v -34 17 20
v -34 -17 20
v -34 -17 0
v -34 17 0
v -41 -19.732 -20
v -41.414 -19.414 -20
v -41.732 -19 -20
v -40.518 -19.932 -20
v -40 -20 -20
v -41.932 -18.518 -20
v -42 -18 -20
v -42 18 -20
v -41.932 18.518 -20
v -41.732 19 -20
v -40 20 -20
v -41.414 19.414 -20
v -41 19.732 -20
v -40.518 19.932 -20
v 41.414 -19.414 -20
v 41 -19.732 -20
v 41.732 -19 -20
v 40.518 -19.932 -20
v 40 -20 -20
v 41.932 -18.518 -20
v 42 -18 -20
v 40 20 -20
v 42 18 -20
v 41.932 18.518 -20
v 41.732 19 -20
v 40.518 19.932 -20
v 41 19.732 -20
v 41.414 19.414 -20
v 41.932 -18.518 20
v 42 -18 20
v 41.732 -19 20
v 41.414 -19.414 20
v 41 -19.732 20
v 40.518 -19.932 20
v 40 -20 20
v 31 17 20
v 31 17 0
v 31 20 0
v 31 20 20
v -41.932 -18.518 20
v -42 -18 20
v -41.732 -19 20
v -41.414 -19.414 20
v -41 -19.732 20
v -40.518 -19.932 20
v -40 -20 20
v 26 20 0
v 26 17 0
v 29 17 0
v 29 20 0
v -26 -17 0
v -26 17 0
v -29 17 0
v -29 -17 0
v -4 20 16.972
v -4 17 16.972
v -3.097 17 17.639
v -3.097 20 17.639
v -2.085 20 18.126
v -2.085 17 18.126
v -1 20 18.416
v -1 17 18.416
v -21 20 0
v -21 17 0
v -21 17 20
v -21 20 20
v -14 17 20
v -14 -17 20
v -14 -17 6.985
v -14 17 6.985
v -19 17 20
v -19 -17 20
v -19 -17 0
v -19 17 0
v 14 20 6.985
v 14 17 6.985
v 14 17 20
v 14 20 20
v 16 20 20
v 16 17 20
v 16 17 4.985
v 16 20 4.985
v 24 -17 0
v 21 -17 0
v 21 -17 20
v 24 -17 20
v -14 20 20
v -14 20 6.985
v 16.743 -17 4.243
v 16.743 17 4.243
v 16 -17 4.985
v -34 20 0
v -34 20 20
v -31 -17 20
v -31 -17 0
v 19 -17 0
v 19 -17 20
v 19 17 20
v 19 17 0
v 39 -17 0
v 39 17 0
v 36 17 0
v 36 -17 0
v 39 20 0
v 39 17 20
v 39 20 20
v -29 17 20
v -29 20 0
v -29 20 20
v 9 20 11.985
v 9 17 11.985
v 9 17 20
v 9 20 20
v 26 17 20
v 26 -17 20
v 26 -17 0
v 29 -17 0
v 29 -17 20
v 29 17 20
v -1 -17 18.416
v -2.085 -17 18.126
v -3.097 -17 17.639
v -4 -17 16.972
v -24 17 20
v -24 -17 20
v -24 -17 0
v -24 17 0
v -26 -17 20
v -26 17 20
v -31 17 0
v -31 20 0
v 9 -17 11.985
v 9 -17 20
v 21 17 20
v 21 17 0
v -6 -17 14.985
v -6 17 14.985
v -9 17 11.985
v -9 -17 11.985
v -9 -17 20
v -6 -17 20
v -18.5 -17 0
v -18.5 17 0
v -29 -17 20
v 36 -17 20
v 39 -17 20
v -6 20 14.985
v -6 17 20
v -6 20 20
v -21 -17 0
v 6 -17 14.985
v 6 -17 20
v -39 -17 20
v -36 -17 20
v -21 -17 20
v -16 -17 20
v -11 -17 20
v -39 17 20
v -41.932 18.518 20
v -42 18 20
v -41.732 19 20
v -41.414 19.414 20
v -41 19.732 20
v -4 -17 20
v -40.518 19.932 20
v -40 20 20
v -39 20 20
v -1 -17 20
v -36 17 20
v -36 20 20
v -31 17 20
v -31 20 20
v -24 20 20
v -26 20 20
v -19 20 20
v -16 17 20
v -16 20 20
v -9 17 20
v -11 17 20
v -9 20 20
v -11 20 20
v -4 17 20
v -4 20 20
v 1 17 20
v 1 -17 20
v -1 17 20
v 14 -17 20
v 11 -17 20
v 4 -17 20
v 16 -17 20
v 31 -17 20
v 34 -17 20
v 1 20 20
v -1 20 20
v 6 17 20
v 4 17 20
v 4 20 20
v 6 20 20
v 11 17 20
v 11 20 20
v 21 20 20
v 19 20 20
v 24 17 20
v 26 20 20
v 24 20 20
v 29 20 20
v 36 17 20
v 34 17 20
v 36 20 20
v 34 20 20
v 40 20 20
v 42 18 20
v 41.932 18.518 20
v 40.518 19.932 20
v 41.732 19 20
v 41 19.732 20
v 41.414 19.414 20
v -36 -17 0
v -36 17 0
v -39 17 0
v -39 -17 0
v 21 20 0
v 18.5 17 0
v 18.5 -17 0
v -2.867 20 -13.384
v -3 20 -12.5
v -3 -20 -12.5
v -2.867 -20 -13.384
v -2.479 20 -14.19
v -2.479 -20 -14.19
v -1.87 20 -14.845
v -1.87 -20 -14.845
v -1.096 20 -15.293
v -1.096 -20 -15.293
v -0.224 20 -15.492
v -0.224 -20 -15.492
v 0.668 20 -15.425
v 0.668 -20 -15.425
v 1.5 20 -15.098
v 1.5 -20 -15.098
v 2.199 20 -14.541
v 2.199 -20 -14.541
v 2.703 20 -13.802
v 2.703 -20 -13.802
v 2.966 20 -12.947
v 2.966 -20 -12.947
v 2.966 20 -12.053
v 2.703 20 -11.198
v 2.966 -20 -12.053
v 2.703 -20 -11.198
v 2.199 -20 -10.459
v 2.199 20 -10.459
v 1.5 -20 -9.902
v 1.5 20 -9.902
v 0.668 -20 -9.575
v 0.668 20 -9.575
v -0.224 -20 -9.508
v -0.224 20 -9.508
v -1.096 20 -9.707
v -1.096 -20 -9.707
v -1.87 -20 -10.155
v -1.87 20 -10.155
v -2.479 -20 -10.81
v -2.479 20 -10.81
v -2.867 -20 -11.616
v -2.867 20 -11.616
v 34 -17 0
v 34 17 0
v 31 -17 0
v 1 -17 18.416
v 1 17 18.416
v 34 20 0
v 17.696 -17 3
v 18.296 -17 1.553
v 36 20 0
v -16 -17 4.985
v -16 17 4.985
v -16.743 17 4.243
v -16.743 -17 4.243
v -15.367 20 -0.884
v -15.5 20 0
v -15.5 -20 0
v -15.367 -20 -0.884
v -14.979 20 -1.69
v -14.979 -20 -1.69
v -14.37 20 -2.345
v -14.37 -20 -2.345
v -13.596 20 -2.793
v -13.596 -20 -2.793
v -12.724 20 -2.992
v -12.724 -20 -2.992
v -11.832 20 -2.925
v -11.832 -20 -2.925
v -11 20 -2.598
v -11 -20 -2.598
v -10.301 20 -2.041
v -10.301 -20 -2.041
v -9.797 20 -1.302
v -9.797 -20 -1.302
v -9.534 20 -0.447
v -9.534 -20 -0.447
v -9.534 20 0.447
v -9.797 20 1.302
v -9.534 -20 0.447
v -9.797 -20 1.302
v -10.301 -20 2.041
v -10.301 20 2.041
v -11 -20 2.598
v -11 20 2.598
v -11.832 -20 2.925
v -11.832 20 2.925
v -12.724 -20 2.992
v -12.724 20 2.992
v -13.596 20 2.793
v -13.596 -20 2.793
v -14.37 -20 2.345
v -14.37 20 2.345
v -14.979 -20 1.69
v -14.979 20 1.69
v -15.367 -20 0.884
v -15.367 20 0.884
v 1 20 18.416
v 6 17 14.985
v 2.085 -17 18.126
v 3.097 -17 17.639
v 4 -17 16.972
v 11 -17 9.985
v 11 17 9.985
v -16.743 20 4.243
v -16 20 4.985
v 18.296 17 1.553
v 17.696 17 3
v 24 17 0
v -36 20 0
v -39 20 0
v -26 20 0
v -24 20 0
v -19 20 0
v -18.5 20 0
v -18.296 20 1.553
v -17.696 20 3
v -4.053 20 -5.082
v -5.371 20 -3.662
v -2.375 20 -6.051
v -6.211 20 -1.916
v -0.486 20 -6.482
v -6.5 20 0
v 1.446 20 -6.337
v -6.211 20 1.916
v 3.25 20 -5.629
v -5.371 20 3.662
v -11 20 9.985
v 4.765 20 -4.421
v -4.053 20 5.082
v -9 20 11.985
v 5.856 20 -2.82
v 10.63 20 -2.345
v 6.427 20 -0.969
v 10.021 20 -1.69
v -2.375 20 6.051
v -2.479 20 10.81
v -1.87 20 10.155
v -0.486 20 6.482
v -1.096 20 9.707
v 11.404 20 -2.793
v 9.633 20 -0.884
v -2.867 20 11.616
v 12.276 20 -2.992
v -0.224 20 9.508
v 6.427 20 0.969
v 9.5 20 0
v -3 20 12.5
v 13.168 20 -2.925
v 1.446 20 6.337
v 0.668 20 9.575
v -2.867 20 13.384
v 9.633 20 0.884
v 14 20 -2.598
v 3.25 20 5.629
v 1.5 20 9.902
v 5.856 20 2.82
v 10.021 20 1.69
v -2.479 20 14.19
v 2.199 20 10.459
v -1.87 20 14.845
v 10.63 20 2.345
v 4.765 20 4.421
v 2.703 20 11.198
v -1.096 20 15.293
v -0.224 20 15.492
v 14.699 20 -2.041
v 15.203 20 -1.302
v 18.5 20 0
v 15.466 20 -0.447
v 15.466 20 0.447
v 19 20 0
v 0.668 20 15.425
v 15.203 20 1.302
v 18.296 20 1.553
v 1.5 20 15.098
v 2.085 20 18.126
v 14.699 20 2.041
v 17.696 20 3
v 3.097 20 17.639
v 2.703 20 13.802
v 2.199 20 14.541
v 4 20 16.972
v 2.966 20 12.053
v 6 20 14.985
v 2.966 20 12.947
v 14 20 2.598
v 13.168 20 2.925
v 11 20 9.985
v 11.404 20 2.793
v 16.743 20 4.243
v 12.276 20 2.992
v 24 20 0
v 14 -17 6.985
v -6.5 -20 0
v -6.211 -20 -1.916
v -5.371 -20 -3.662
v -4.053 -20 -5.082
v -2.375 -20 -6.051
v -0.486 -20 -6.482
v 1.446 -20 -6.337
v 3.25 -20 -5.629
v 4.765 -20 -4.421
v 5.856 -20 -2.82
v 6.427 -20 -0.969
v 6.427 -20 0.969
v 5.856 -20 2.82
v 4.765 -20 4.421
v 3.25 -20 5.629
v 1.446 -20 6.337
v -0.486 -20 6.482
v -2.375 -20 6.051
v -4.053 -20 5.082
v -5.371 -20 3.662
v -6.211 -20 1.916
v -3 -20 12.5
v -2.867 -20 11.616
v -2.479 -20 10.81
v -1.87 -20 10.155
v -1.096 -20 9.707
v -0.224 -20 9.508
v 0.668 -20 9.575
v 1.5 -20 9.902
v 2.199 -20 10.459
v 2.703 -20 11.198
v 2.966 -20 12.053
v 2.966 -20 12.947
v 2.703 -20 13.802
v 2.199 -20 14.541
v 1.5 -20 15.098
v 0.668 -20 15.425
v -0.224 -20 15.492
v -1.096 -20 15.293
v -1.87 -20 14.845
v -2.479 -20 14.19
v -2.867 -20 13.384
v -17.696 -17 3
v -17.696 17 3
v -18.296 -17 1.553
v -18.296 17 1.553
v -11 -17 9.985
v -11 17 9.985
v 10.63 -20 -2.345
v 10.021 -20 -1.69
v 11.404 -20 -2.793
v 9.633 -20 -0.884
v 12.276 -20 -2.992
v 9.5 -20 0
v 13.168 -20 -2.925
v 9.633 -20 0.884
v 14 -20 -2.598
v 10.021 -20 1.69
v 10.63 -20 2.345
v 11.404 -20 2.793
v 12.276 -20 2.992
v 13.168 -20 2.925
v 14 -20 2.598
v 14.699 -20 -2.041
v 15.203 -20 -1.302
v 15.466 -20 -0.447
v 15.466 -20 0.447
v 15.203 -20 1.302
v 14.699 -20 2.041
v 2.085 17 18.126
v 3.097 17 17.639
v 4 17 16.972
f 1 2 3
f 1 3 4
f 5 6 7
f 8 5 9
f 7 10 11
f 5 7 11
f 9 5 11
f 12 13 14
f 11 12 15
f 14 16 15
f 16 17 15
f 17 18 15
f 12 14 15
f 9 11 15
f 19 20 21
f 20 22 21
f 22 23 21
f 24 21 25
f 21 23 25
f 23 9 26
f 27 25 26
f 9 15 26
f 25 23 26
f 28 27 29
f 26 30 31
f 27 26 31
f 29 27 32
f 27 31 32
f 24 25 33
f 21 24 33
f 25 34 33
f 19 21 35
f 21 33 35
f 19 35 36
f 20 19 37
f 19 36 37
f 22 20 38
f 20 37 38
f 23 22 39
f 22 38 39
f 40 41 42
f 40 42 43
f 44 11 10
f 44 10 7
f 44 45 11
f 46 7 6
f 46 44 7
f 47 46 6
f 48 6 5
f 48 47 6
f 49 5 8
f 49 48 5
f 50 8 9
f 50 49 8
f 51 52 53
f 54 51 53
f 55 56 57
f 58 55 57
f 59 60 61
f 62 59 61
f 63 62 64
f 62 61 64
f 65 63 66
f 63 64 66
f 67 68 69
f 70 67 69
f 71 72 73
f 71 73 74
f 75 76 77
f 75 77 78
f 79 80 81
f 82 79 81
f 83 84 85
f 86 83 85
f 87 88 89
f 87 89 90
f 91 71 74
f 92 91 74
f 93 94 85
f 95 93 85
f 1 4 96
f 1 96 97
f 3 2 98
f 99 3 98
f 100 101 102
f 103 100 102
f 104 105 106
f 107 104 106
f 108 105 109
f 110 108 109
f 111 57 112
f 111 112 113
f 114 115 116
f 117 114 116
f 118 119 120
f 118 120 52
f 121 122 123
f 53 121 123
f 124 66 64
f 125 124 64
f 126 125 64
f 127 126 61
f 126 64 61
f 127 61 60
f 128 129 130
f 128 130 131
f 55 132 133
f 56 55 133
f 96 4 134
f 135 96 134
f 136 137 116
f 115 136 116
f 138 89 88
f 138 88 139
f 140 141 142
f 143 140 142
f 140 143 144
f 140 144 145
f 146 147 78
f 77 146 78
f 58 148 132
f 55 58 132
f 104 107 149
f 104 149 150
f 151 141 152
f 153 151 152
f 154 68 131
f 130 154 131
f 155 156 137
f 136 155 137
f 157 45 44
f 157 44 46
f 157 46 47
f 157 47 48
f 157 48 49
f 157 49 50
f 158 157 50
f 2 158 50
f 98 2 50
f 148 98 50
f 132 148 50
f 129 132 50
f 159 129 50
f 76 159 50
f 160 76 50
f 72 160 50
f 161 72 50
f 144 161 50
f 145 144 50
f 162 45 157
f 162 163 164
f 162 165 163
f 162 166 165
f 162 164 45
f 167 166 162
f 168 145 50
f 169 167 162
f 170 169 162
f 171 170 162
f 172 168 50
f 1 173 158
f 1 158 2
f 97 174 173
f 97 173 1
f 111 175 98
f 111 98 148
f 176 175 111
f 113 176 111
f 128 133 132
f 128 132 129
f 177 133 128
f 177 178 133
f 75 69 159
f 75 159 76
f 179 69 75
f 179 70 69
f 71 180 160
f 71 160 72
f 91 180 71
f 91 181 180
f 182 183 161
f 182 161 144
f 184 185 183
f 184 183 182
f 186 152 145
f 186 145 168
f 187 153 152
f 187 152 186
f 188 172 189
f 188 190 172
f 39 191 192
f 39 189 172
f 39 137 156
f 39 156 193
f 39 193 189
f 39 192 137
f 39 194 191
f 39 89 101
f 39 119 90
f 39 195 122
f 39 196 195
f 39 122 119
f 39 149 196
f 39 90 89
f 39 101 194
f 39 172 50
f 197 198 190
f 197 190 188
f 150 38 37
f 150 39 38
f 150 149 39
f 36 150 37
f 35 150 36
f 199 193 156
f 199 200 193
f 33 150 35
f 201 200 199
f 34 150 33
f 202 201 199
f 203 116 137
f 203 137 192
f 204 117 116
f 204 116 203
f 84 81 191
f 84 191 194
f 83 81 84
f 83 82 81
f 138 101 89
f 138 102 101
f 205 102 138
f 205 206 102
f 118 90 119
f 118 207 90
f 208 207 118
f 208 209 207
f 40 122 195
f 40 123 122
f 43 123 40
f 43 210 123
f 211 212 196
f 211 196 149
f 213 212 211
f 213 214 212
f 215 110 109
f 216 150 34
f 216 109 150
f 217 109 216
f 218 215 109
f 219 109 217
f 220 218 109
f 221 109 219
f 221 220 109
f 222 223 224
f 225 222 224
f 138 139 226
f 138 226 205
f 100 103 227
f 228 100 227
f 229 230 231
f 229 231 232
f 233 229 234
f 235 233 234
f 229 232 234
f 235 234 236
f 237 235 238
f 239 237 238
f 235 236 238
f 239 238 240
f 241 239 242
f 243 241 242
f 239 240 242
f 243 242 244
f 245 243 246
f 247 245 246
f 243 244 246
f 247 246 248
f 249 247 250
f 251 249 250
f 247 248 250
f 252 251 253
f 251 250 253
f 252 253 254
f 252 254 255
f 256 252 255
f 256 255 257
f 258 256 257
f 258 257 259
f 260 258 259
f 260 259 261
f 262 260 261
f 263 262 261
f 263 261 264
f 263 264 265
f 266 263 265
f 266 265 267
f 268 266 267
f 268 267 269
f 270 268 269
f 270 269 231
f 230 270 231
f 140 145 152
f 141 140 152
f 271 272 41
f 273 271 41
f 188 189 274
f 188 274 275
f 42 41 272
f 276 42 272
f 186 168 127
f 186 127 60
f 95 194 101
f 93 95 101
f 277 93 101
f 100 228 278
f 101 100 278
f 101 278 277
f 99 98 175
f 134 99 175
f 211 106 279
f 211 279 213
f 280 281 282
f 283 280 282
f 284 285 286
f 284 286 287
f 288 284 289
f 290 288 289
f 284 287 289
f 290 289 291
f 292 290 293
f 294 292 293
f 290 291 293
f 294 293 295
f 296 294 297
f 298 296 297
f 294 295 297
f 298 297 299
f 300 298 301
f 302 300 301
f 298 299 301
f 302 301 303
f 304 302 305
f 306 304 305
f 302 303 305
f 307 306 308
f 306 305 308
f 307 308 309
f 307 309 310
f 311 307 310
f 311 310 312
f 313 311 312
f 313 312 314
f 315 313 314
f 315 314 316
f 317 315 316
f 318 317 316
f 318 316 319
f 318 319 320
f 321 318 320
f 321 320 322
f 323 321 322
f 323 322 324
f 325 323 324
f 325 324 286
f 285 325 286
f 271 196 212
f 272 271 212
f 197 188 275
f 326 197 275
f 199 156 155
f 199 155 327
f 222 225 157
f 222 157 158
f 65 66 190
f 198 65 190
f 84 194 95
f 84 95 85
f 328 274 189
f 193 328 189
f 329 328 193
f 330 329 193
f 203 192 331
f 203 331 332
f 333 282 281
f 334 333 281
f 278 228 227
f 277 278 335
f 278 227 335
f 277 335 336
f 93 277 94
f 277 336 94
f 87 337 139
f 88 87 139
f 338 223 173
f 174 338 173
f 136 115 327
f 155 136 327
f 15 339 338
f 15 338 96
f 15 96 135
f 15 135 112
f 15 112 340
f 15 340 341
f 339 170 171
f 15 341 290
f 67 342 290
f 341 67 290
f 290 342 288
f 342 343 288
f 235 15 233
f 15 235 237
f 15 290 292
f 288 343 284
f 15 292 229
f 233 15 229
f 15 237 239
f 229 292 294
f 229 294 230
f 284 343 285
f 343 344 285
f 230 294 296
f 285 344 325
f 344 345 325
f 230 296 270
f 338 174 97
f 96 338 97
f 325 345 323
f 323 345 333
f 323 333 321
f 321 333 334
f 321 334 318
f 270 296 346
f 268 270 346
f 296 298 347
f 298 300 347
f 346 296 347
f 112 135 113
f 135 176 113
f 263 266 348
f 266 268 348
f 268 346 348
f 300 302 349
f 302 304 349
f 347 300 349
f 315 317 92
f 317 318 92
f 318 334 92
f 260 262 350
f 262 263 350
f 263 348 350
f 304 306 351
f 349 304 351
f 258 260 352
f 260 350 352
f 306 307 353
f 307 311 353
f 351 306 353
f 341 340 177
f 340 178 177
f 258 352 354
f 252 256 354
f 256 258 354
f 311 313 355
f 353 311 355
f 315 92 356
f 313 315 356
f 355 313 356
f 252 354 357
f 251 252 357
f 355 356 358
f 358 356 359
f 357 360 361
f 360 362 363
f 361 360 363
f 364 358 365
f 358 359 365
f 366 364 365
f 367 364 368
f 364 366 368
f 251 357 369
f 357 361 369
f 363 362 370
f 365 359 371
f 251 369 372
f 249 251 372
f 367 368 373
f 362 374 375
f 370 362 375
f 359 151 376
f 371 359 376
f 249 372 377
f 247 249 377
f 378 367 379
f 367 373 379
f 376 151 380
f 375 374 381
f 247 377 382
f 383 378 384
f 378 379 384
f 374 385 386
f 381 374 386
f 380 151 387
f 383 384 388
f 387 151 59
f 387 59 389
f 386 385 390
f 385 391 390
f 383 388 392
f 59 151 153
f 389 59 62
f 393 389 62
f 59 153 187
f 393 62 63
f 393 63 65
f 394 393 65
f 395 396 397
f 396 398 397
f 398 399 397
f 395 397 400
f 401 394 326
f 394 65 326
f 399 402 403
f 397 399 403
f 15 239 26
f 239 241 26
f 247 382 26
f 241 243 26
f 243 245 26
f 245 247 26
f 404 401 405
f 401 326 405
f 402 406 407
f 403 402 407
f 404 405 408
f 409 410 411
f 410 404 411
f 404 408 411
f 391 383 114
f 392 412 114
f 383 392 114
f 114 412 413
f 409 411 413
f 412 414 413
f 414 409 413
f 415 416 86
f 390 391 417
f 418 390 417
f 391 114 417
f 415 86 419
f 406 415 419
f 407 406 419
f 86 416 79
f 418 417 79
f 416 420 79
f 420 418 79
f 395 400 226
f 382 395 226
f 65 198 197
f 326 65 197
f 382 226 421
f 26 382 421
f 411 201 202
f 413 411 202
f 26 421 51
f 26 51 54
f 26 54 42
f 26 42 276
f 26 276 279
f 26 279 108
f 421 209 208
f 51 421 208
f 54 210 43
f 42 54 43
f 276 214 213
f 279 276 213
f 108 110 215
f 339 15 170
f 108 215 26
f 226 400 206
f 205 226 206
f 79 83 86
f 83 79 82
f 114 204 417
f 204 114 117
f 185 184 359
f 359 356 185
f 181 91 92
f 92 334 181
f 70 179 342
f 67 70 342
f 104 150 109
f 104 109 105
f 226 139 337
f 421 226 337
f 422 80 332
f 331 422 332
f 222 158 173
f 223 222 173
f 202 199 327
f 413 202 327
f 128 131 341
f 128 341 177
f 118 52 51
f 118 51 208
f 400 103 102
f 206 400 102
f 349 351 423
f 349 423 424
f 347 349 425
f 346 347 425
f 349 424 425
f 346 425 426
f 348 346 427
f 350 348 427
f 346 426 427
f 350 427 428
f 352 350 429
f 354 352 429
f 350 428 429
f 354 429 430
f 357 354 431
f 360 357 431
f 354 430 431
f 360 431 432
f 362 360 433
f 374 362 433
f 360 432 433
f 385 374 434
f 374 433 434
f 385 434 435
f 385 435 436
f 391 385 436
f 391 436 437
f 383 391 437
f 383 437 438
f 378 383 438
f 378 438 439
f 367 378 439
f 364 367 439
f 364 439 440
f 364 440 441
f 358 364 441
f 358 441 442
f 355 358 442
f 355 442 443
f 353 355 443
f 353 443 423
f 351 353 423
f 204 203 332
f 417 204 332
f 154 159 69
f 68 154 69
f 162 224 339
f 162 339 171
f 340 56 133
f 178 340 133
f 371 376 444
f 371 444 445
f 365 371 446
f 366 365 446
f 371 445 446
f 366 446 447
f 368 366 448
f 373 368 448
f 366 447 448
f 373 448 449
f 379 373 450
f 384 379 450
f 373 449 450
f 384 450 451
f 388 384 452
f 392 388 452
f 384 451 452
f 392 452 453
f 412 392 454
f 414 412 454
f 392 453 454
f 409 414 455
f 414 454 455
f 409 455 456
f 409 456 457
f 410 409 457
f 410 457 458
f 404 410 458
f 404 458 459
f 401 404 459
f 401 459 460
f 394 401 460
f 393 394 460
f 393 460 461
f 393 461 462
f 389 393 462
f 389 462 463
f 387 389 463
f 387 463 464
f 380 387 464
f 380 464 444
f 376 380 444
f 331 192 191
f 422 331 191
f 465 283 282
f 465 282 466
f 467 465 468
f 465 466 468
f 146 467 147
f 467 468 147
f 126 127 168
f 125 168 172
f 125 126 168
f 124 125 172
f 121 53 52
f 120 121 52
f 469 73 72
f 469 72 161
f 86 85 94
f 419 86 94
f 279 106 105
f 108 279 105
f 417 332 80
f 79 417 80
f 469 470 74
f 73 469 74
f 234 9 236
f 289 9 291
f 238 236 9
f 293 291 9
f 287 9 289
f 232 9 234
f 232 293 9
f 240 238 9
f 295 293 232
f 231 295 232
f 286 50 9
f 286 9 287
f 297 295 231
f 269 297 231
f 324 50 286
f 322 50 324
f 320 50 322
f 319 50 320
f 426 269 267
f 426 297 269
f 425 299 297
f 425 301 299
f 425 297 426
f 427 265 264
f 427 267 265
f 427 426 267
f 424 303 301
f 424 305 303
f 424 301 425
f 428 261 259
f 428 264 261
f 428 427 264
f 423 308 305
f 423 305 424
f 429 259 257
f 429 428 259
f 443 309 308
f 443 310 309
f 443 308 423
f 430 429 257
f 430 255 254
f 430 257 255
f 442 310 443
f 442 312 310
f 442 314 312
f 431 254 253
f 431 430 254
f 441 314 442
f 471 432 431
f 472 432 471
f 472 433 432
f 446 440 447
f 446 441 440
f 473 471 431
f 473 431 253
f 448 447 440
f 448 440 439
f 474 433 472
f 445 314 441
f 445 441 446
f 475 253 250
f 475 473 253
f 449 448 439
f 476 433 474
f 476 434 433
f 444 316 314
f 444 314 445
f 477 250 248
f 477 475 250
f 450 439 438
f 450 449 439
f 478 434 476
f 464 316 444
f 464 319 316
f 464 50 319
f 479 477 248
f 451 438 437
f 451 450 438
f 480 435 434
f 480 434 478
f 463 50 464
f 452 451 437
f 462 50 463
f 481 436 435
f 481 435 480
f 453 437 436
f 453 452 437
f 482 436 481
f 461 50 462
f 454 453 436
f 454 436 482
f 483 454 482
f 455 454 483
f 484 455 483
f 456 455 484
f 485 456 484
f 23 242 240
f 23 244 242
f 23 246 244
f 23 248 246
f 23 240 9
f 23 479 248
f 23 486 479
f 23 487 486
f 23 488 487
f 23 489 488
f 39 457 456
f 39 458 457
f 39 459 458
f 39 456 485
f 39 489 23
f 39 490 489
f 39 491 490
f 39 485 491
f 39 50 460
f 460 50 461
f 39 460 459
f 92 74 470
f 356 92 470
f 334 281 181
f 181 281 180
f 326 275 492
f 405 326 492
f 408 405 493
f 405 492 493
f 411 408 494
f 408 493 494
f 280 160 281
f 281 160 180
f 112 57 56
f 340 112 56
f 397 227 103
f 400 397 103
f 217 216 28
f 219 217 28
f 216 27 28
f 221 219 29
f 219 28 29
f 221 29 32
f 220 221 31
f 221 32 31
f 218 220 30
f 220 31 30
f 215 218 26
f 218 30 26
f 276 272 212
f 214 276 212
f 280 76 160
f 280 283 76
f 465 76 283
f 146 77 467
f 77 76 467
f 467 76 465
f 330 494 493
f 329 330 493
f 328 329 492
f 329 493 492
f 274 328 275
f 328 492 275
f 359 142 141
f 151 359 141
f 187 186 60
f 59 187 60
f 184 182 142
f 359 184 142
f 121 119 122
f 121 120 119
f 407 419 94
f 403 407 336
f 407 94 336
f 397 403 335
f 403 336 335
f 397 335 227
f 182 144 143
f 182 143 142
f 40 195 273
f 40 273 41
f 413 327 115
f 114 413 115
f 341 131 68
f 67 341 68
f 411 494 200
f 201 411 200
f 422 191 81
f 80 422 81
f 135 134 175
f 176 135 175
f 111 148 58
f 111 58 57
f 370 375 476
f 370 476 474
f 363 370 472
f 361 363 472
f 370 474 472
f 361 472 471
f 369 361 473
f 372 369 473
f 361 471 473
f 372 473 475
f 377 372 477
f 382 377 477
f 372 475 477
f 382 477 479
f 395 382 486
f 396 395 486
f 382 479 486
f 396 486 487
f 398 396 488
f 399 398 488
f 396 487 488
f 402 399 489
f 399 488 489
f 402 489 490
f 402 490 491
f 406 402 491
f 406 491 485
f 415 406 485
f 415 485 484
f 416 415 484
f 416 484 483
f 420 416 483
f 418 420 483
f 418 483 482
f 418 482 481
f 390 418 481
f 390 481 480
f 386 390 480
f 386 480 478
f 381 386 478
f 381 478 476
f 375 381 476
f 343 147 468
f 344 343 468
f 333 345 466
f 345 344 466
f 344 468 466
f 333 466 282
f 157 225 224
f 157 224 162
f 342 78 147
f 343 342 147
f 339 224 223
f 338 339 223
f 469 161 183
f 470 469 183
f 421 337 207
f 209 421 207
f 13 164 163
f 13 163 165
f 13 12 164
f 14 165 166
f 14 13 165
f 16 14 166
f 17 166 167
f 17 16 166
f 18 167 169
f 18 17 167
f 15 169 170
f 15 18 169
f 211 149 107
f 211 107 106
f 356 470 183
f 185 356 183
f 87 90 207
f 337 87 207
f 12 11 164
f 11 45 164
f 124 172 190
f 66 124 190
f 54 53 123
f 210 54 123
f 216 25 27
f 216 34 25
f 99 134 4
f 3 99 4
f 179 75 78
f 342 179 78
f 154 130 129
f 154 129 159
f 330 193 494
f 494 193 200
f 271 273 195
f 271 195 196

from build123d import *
from build123d.topology import SkipClean

# Parameters (mm, degrees)
SKETCH1_W           = 84
SKETCH1_H           = 40
BOSS_EXTRUDE1_DEPTH = 20
FILLET1_R           = 2
HOLE1_D             = 13
HOLE2_D             = 6
CUT_EXTRUDE2_DEPTH  = 17
RIB1_REACH          = 63.351
SKETCH10_WALLS_W    = 2
SKETCH10_WALLS_H    = 158.702893202
SKETCH12_W          = 3
SKETCH12_H          = 20
CUT_EXTRUDE3_DEPTH  = 60.439044407


with BuildPart() as part:
    # Sketch1 → Boss-Extrude1 (new, symmetric)
    with BuildSketch(Plane.XY):
        Rectangle(SKETCH1_W, SKETCH1_H)
    extrude(amount=BOSS_EXTRUDE1_DEPTH, both=True)

    # Fillet1
    fillet1_edges = [part.edges().sort_by_distance(p)[0] for p in [
        (42, -20, 0),
        (-42, -20, 0),
        (-42, 20, 0),
        (42, 20, 0),
    ]]
    fillet(fillet1_edges, radius=FILLET1_R)

    # Hole1 (through all)
    with Locations(Plane(origin=(0, 20, 0), x_dir=(1, 0, 0), z_dir=(0, 1, 0))):
        with Locations((0, 0)):
            Hole(HOLE1_D / 2)

    # Hole2 (through all)
    with Locations(Plane(origin=(0, 20, 0), x_dir=(1, 0, 0), z_dir=(0, 1, 0))):
        with Locations((12.5, 0), (0, -12.5), (-12.5, 0), (0, 12.5), (0, 0)):
            Hole(HOLE2_D / 2)

    # Sketch9 → Cut-Extrude2 (cut, symmetric)
    with BuildSketch(Plane(origin=(0, 0, 0), x_dir=(1, 0, 0), z_dir=(0, 1, 0))):
        with BuildLine():
            Line((-39, -20), (0, -20))
            Line((0, -20), (0, -18.5))
            ThreePointArc((0, -18.5), (-2.296100594, -18.043277195), (-4.242640687, -16.742640687))
            Line((-4.242640687, -16.742640687), (-16.742640687, -4.242640687))
            ThreePointArc((-16.742640687, -4.242640687), (-18.043277195, -2.296100594), (-18.5, 0))
            Line((-18.5, 0), (-39, 0))
            Line((-39, 0), (-39, -20))
        make_face()
        with BuildLine():
            Line((39, 0), (18.5, 0))
            ThreePointArc((18.5, 0), (18.043277195, -2.296100594), (16.742640687, -4.242640687))
            Line((16.742640687, -4.242640687), (4.242640687, -16.742640687))
            ThreePointArc((4.242640687, -16.742640687), (2.296100594, -18.043277195), (0, -18.5))
            Line((0, -18.5), (0, -20))
            Line((0, -20), (39, -20))
            Line((39, -20), (39, 0))
        make_face()
    extrude(amount=CUT_EXTRUDE2_DEPTH, both=True, mode=Mode.SUBTRACT)

    # Sketch10 walls → Rib1 (add, up to next)
    with BuildSketch(Plane.XY.offset(20), mode=Mode.PRIVATE) as rib1_sk1:
        Rectangle(SKETCH10_WALLS_W, SKETCH10_WALLS_H)
    rib1_tool1 = extrude(rib1_sk1.sketch, amount=-RIB1_REACH, mode=Mode.PRIVATE) - part.part
    # Sketch10 walls → Rib1 (add, up to next)
    with BuildSketch(Plane.XY.offset(20), mode=Mode.PRIVATE) as rib1_sk2:
        with Locations((5, 0)):
            Rectangle(SKETCH10_WALLS_W, SKETCH10_WALLS_H)
    rib1_tool2 = extrude(rib1_sk2.sketch, amount=-RIB1_REACH, mode=Mode.PRIVATE) - part.part
    # Sketch10 walls → Rib1 (add, up to next)
    with BuildSketch(Plane.XY.offset(20), mode=Mode.PRIVATE) as rib1_sk3:
        with Locations((10, 0)):
            Rectangle(SKETCH10_WALLS_W, SKETCH10_WALLS_H)
    rib1_tool3 = extrude(rib1_sk3.sketch, amount=-RIB1_REACH, mode=Mode.PRIVATE) - part.part
    # Sketch10 walls → Rib1 (add, up to next)
    with BuildSketch(Plane.XY.offset(20), mode=Mode.PRIVATE) as rib1_sk4:
        with Locations((15, 0)):
            Rectangle(SKETCH10_WALLS_W, SKETCH10_WALLS_H)
    rib1_tool4 = extrude(rib1_sk4.sketch, amount=-RIB1_REACH, mode=Mode.PRIVATE) - part.part
    # Sketch10 walls → Rib1 (add, up to next)
    with BuildSketch(Plane.XY.offset(20), mode=Mode.PRIVATE) as rib1_sk5:
        with Locations((20, 0)):
            Rectangle(SKETCH10_WALLS_W, SKETCH10_WALLS_H)
    rib1_tool5 = extrude(rib1_sk5.sketch, amount=-RIB1_REACH, mode=Mode.PRIVATE) - part.part
    # Sketch10 walls → Rib1 (add, up to next)
    with BuildSketch(Plane.XY.offset(20), mode=Mode.PRIVATE) as rib1_sk6:
        with Locations((25, 0)):
            Rectangle(SKETCH10_WALLS_W, SKETCH10_WALLS_H)
    rib1_tool6 = extrude(rib1_sk6.sketch, amount=-RIB1_REACH, mode=Mode.PRIVATE) - part.part
    # Sketch10 walls → Rib1 (add, up to next)
    with BuildSketch(Plane.XY.offset(20), mode=Mode.PRIVATE) as rib1_sk7:
        with Locations((30, 0)):
            Rectangle(SKETCH10_WALLS_W, SKETCH10_WALLS_H)
    rib1_tool7 = extrude(rib1_sk7.sketch, amount=-RIB1_REACH, mode=Mode.PRIVATE) - part.part
    # Sketch10 walls → Rib1 (add, up to next)
    with BuildSketch(Plane.XY.offset(20), mode=Mode.PRIVATE) as rib1_sk8:
        with Locations((35, 0)):
            Rectangle(SKETCH10_WALLS_W, SKETCH10_WALLS_H)
    rib1_tool8 = extrude(rib1_sk8.sketch, amount=-RIB1_REACH, mode=Mode.PRIVATE) - part.part
    # Sketch10 walls → Rib1 (add, up to next)
    with BuildSketch(Plane.XY.offset(20), mode=Mode.PRIVATE) as rib1_sk9:
        with Locations((-25, 0)):
            Rectangle(SKETCH10_WALLS_W, SKETCH10_WALLS_H)
    rib1_tool9 = extrude(rib1_sk9.sketch, amount=-RIB1_REACH, mode=Mode.PRIVATE) - part.part
    # Sketch10 walls → Rib1 (add, up to next)
    with BuildSketch(Plane.XY.offset(20), mode=Mode.PRIVATE) as rib1_sk10:
        with Locations((-20, 0)):
            Rectangle(SKETCH10_WALLS_W, SKETCH10_WALLS_H)
    rib1_tool10 = extrude(rib1_sk10.sketch, amount=-RIB1_REACH, mode=Mode.PRIVATE) - part.part
    # Sketch10 walls → Rib1 (add, up to next)
    with BuildSketch(Plane.XY.offset(20), mode=Mode.PRIVATE) as rib1_sk11:
        with Locations((-15, 0)):
            Rectangle(SKETCH10_WALLS_W, SKETCH10_WALLS_H)
    rib1_tool11 = extrude(rib1_sk11.sketch, amount=-RIB1_REACH, mode=Mode.PRIVATE) - part.part
    # Sketch10 walls → Rib1 (add, up to next)
    with BuildSketch(Plane.XY.offset(20), mode=Mode.PRIVATE) as rib1_sk12:
        with Locations((-10, 0)):
            Rectangle(SKETCH10_WALLS_W, SKETCH10_WALLS_H)
    rib1_tool12 = extrude(rib1_sk12.sketch, amount=-RIB1_REACH, mode=Mode.PRIVATE) - part.part
    # Sketch10 walls → Rib1 (add, up to next)
    with BuildSketch(Plane.XY.offset(20), mode=Mode.PRIVATE) as rib1_sk13:
        with Locations((-5, 0)):
            Rectangle(SKETCH10_WALLS_W, SKETCH10_WALLS_H)
    rib1_tool13 = extrude(rib1_sk13.sketch, amount=-RIB1_REACH, mode=Mode.PRIVATE) - part.part
    # Sketch10 walls → Rib1 (add, up to next)
    with BuildSketch(Plane.XY.offset(20), mode=Mode.PRIVATE) as rib1_sk14:
        with Locations((-30, 0)):
            Rectangle(SKETCH10_WALLS_W, SKETCH10_WALLS_H)
    rib1_tool14 = extrude(rib1_sk14.sketch, amount=-RIB1_REACH, mode=Mode.PRIVATE) - part.part
    # Sketch10 walls → Rib1 (add, up to next)
    with BuildSketch(Plane.XY.offset(20), mode=Mode.PRIVATE) as rib1_sk15:
        with Locations((-35, 0)):
            Rectangle(SKETCH10_WALLS_W, SKETCH10_WALLS_H)
    rib1_tool15 = extrude(rib1_sk15.sketch, amount=-RIB1_REACH, mode=Mode.PRIVATE) - part.part
    add(rib1_tool1.solids().sort_by_distance((0, 0, 20))[0])
    add(rib1_tool2.solids().sort_by_distance((5, 0, 20))[0])
    add(rib1_tool3.solids().sort_by_distance((10, 0, 20))[0])
    add(rib1_tool4.solids().sort_by_distance((15, 0, 20))[0])
    add(rib1_tool5.solids().sort_by_distance((20, 0, 20))[0])
    add(rib1_tool6.solids().sort_by_distance((25, 0, 20))[0])
    add(rib1_tool7.solids().sort_by_distance((30, 0, 20))[0])
    add(rib1_tool8.solids().sort_by_distance((35, 0, 20))[0])
    add(rib1_tool9.solids().sort_by_distance((-25, 0, 20))[0])
    add(rib1_tool10.solids().sort_by_distance((-20, 0, 20))[0])
    add(rib1_tool11.solids().sort_by_distance((-15, 0, 20))[0])
    add(rib1_tool12.solids().sort_by_distance((-10, 0, 20))[0])
    add(rib1_tool13.solids().sort_by_distance((-5, 0, 20))[0])
    add(rib1_tool14.solids().sort_by_distance((-30, 0, 20))[0])
    add(rib1_tool15.solids().sort_by_distance((-35, 0, 20))[0])

    # Sketch12 → Cut-Extrude3 (cut, through all)
    with SkipClean():  # the faces are left unmerged after this step: merging them gives an invalid solid
        with BuildSketch(Plane.XZ.offset(-17)):
            with Locations((37.5, 10)):
                Rectangle(SKETCH12_W, SKETCH12_H)
            with Locations((32.5, 10)):
                Rectangle(SKETCH12_W, SKETCH12_H)
            with Locations((27.5, 10)):
                Rectangle(SKETCH12_W, SKETCH12_H)
            with Locations((22.5, 10)):
                Rectangle(SKETCH12_W, SKETCH12_H)
            with BuildLine():
                Line((18.5, 0), (19, 0))
                Line((19, 0), (19, 20))
                Line((19, 20), (16, 20))
                Line((16, 20), (16, 4.985281374))
                Line((16, 4.985281374), (16.742640687, 4.242640687))
                ThreePointArc((16.742640687, 4.242640687), (18.043277195, 2.296100594), (18.5, 0))
            make_face()
            Polygon((11, 9.985281374), (14, 6.985281374), (14, 20), (11, 20), align=None)
            Polygon((6, 14.985281374), (9, 11.985281374), (9, 20), (6, 20), align=None)
            with BuildLine():
                Line((4, 16.972135955), (4, 20))
                Line((4, 20), (1, 20))
                Line((1, 20), (1, 18.416079783))
                ThreePointArc((1, 18.416079783), (2.602161303, 17.906362599), (4, 16.972135955))
            make_face()
            with BuildLine():
                Line((-4, 20), (-4, 16.972135955))
                ThreePointArc((-4, 16.972135955), (-2.602161303, 17.906362599), (-1, 18.416079783))
                Line((-1, 18.416079783), (-1, 20))
                Line((-1, 20), (-4, 20))
            make_face()
            Polygon((-9, 11.985281374), (-6, 14.985281374), (-6, 20), (-9, 20), align=None)
            Polygon((-14, 6.985281374), (-11, 9.985281374), (-11, 20), (-14, 20), align=None)
            with BuildLine():
                Line((-16.742640687, 4.242640687), (-16, 4.985281374))
                Line((-16, 4.985281374), (-16, 20))
                Line((-16, 20), (-19, 20))
                Line((-19, 20), (-19, 0))
                Line((-19, 0), (-18.5, 0))
                ThreePointArc((-18.5, 0), (-18.043277195, 2.296100594), (-16.742640687, 4.242640687))
            make_face()
            with Locations((-22.5, 10)):
                Rectangle(SKETCH12_W, SKETCH12_H)
            with Locations((-27.5, 10)):
                Rectangle(SKETCH12_W, SKETCH12_H)
            with Locations((-32.5, 10)):
                Rectangle(SKETCH12_W, SKETCH12_H)
            with Locations((-37.5, 10)):
                Rectangle(SKETCH12_W, SKETCH12_H)
        extrude(amount=-CUT_EXTRUDE3_DEPTH, mode=Mode.SUBTRACT)


solid = part.part
